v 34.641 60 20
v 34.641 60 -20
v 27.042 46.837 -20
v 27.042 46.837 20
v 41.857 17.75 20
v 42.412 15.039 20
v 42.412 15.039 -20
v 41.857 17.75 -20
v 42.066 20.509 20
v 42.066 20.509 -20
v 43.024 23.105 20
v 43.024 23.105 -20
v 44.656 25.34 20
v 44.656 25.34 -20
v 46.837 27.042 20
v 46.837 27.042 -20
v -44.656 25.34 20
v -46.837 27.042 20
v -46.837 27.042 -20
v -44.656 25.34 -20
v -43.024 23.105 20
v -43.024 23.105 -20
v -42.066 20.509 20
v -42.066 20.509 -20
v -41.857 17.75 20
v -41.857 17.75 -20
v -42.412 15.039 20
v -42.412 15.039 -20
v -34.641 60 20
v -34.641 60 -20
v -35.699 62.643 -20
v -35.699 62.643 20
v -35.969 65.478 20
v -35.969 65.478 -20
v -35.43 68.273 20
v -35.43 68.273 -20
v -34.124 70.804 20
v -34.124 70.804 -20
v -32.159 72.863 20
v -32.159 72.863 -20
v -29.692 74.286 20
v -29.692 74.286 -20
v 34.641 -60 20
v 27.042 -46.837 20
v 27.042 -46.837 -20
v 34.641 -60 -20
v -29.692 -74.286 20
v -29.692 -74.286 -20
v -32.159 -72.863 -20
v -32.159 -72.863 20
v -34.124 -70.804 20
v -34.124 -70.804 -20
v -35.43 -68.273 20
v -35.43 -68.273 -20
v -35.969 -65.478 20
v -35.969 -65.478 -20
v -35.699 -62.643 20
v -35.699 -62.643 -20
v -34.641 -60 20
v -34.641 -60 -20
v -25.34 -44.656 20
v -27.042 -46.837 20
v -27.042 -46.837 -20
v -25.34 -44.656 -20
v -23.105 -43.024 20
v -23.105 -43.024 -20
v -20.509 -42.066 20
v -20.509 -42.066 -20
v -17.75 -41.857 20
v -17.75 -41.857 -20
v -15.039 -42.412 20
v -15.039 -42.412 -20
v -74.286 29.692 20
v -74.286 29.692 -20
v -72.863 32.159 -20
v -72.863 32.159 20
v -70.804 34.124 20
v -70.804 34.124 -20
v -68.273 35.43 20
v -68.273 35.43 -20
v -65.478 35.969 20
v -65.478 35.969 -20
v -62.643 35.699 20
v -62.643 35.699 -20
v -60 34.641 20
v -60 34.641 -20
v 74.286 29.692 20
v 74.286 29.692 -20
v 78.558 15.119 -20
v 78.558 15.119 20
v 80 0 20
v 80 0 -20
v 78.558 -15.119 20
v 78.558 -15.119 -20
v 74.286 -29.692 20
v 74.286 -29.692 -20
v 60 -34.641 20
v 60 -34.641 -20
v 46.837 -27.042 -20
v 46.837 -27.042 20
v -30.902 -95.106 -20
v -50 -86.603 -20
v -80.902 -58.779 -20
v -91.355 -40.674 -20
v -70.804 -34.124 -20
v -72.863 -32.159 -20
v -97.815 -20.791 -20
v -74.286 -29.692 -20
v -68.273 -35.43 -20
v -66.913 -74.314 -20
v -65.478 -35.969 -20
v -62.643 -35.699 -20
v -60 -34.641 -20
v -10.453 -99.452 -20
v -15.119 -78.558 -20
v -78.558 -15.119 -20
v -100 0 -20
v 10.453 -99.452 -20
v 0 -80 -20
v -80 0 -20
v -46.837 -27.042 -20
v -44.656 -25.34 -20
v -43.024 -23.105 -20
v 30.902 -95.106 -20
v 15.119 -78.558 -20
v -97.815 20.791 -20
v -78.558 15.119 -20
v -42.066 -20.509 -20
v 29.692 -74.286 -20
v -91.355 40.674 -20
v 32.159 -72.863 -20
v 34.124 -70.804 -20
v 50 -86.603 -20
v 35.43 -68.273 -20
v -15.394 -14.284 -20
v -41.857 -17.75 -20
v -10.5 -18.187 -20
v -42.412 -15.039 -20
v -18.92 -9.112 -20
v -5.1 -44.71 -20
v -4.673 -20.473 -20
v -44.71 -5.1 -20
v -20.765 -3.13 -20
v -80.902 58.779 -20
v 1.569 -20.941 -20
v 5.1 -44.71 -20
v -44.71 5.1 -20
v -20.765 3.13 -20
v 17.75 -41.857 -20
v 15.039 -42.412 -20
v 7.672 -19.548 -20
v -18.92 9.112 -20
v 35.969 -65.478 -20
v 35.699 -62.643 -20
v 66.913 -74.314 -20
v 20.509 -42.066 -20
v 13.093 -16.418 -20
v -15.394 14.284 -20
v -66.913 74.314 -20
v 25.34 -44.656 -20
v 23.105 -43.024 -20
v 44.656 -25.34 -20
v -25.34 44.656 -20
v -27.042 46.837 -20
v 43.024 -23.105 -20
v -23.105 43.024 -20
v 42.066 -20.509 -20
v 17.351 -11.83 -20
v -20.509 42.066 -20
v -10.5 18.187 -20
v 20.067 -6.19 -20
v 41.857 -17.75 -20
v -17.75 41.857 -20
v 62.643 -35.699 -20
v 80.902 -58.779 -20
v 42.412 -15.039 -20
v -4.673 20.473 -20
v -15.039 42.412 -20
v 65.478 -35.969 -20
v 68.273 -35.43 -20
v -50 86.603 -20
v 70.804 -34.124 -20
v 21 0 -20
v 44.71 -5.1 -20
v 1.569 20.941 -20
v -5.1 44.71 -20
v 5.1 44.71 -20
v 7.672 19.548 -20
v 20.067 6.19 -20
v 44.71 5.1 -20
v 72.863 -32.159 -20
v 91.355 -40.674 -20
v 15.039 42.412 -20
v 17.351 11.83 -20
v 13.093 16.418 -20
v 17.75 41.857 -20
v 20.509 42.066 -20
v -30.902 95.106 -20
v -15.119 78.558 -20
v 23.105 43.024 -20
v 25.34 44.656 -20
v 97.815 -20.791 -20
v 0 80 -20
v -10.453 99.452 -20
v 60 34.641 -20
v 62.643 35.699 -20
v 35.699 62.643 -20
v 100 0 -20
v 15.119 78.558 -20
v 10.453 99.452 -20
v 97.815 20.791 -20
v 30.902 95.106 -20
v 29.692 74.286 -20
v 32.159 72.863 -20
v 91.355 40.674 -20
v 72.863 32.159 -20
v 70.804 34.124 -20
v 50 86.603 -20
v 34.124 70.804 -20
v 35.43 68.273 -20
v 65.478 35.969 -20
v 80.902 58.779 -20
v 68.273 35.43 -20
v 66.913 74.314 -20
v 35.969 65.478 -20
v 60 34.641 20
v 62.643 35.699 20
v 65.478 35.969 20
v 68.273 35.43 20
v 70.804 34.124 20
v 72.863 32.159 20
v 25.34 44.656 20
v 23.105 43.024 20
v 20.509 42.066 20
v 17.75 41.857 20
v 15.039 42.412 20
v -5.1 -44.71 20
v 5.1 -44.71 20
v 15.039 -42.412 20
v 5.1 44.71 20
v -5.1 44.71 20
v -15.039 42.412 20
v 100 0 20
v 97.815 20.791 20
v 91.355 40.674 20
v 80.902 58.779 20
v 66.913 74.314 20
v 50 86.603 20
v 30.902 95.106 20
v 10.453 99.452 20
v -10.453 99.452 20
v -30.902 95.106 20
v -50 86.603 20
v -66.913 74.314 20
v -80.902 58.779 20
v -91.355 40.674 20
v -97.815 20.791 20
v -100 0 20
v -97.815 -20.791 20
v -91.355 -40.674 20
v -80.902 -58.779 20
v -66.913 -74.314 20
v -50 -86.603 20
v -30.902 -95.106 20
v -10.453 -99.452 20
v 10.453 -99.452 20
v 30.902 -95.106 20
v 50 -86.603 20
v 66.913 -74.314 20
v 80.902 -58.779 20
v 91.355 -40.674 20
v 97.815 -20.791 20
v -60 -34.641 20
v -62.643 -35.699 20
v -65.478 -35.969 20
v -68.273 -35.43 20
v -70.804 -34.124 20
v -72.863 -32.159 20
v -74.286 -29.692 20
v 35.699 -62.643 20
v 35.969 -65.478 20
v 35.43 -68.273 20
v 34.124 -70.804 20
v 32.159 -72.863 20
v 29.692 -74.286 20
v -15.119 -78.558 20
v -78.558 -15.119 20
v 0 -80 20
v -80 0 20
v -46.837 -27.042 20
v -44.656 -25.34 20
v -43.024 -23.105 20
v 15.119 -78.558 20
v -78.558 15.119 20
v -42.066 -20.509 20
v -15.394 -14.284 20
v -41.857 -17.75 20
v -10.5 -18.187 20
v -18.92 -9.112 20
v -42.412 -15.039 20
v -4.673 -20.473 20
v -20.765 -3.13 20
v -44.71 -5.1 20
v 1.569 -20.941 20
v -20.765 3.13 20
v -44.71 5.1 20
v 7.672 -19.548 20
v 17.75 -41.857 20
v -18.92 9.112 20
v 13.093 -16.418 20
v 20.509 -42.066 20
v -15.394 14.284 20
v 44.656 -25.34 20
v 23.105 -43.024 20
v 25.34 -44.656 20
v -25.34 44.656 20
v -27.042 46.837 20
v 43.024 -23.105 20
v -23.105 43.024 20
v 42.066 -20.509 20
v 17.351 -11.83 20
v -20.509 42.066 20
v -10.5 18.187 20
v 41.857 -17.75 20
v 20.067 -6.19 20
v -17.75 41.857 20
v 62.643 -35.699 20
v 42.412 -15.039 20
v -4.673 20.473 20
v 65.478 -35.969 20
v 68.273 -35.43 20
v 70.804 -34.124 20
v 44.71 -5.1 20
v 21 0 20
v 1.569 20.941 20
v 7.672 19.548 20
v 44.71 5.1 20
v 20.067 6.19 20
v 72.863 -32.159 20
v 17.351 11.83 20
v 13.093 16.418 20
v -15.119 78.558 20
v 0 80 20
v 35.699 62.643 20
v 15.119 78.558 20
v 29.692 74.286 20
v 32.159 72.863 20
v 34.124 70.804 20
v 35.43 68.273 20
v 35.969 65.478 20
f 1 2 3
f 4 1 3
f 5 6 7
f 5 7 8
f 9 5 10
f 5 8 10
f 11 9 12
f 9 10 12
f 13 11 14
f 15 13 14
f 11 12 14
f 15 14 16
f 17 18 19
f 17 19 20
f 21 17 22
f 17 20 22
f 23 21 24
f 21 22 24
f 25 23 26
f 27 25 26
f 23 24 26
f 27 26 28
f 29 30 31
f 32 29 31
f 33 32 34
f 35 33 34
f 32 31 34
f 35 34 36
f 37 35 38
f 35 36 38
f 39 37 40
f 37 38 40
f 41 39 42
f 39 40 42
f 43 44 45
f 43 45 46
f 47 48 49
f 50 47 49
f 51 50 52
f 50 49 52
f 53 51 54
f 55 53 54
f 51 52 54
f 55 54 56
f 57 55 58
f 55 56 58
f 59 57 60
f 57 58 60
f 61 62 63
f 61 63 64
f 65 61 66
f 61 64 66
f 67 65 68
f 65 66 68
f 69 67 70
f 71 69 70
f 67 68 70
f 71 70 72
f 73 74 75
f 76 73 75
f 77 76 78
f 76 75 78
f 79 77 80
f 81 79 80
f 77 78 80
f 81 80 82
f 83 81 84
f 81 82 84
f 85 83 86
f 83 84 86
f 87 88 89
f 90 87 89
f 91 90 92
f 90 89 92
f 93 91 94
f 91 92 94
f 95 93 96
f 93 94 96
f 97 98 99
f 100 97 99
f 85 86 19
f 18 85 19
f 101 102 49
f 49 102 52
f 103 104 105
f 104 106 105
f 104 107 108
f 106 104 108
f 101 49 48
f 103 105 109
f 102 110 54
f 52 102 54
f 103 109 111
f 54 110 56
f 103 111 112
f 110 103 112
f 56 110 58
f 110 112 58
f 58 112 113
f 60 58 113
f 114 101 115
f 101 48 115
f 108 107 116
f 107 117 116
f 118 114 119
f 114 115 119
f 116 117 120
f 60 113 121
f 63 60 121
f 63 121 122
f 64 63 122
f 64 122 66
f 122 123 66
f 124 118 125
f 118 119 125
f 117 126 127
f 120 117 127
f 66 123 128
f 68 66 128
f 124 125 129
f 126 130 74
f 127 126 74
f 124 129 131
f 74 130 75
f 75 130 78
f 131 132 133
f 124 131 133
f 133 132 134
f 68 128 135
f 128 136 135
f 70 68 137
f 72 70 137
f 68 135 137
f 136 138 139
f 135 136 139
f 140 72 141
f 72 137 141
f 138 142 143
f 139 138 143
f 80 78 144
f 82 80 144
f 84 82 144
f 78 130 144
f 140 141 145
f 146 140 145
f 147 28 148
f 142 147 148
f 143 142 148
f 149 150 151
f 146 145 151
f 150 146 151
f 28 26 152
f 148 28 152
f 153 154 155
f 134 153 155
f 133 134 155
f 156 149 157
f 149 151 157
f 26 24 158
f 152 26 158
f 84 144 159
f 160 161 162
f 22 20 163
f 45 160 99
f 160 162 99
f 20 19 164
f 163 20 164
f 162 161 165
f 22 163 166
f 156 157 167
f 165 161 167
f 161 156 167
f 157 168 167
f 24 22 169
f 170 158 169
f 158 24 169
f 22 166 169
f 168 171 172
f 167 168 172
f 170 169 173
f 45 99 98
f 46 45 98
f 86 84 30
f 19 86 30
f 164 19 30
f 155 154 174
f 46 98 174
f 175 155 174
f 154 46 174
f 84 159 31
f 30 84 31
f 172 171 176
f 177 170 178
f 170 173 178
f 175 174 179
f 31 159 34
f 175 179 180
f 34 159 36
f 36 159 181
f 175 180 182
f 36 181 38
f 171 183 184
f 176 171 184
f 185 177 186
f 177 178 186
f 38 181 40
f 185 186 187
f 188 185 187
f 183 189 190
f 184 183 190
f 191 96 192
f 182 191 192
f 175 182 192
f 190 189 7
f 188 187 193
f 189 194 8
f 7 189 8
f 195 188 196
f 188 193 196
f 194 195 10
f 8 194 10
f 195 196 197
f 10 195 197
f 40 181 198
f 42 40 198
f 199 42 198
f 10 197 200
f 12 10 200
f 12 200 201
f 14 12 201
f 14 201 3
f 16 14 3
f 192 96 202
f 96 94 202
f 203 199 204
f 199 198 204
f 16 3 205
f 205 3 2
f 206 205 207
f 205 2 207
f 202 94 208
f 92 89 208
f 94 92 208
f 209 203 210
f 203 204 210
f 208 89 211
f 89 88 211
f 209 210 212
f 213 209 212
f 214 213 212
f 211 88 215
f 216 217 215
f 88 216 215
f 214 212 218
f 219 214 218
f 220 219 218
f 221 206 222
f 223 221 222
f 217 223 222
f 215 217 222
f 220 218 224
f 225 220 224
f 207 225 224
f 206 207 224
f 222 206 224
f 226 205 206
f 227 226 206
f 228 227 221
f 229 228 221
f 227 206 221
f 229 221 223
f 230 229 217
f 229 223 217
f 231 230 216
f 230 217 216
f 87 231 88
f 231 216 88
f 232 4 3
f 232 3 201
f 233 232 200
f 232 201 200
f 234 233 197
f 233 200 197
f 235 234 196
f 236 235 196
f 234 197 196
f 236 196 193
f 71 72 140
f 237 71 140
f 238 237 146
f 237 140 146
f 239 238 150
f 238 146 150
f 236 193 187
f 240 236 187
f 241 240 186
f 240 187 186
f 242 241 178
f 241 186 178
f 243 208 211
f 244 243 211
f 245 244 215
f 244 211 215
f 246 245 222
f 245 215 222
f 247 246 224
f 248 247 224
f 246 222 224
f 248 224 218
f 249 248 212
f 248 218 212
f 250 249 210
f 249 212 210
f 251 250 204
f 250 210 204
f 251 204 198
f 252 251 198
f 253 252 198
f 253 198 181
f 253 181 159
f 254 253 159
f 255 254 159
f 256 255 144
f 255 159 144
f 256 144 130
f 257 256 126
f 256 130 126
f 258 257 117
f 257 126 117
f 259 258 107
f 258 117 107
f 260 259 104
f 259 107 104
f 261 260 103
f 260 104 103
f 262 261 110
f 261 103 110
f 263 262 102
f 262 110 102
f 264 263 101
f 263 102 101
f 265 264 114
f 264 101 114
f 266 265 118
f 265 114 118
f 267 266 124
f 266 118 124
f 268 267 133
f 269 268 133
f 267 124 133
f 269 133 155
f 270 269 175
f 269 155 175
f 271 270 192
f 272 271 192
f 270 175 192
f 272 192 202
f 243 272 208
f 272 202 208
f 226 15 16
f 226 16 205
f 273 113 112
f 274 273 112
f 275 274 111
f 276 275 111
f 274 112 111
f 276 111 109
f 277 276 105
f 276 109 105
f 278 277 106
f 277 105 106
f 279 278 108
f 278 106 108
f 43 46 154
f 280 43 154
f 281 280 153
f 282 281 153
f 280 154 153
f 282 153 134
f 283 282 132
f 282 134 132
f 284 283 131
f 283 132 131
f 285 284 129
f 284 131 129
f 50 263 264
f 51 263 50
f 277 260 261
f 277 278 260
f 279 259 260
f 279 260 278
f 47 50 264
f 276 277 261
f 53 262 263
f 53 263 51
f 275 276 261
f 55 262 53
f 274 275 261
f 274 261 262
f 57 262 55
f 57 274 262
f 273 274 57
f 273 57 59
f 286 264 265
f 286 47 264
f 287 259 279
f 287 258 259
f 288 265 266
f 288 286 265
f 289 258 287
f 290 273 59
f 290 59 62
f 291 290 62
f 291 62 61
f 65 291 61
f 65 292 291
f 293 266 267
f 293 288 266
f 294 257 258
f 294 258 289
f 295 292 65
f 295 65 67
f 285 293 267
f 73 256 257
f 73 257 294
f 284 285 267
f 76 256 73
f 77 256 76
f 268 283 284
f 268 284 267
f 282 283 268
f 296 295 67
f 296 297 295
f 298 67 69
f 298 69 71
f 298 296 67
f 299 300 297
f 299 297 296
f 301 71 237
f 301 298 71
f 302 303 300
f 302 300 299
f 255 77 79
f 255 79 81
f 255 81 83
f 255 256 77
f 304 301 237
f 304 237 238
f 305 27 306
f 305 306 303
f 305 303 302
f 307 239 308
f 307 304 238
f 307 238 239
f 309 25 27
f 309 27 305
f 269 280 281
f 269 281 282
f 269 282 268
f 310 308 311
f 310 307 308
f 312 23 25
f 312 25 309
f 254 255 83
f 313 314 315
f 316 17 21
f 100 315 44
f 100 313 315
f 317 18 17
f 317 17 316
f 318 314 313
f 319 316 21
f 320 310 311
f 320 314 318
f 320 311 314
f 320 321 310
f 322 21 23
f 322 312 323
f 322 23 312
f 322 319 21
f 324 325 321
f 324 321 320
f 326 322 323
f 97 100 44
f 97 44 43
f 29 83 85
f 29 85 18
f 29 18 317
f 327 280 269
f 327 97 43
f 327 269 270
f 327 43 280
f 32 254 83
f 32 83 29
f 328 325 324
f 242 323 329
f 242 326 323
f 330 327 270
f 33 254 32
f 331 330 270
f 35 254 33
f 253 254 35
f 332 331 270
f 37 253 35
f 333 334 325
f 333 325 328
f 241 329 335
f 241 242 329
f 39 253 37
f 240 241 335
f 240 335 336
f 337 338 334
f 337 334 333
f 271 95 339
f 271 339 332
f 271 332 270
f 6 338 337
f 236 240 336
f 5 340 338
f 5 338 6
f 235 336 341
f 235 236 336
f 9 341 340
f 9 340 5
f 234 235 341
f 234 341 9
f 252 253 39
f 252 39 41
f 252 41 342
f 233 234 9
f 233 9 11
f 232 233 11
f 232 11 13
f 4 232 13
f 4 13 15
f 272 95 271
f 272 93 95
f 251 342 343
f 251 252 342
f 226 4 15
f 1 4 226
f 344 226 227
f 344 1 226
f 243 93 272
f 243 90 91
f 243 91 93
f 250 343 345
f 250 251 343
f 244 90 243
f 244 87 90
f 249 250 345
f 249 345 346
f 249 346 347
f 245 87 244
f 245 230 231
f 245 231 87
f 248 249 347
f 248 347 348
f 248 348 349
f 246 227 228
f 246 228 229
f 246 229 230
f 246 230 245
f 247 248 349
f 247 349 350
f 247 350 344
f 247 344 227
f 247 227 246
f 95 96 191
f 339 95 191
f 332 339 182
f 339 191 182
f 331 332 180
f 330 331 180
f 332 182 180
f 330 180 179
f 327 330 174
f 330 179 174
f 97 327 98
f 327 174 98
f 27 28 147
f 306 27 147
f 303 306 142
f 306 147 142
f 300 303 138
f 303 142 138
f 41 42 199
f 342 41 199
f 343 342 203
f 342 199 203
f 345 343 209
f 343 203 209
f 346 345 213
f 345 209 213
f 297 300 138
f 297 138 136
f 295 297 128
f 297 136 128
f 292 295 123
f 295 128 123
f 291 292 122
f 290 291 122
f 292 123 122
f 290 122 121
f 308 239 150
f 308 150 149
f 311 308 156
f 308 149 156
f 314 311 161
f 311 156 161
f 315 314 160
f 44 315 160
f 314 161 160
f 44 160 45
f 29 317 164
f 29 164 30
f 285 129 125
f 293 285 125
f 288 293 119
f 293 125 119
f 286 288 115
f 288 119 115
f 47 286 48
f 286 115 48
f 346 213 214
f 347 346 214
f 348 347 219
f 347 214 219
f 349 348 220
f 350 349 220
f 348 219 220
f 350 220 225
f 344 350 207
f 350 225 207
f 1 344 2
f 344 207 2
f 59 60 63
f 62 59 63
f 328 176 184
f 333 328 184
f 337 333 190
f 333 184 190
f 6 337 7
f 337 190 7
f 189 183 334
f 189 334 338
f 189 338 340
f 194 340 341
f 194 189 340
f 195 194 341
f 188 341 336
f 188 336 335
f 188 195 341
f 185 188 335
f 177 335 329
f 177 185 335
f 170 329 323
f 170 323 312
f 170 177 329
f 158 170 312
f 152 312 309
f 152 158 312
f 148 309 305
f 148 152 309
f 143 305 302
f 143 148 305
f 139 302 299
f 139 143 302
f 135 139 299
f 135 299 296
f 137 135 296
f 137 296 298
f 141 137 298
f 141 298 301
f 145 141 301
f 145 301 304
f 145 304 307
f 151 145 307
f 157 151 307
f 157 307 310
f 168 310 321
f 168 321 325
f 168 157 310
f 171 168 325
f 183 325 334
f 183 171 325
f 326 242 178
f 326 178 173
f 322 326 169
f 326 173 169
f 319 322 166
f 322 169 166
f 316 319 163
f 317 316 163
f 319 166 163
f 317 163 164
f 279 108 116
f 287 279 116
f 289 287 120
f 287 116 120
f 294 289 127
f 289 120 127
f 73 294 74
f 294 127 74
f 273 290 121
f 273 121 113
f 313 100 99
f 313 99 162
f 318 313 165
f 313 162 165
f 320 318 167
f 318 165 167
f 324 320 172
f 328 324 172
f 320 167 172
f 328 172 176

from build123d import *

# Parameters (mm, degrees)
BOSS_EXTRUDE1_DEPTH      = 20
BOSS_EXTRUDE1_DEPTH_BACK = 20
SKETCH1_R                = 30
SKETCH1_R_2              = 21
BOSS_EXTRUDE2_DEPTH      = 20
BOSS_EXTRUDE2_DEPTH_BACK = 20
SKETCH2_R                = 100
SKETCH2_R_2              = 21
CUT_EXTRUDE1_DEPTH       = 20
CUT_EXTRUDE1_DEPTH_BACK  = 20


with BuildPart() as part:
    # Sketch1 → Boss-Extrude1 (new, two sides: drawn at the far end of the back side and taken through both)
    with BuildSketch(Plane.XY.offset(-BOSS_EXTRUDE1_DEPTH_BACK)):
        Circle(SKETCH1_R)
        Circle(SKETCH1_R_2, mode=Mode.SUBTRACT)
    extrude(amount=BOSS_EXTRUDE1_DEPTH + BOSS_EXTRUDE1_DEPTH_BACK)

    # Sketch2 → Boss-Extrude2 (add, two sides: drawn at the far end of the back side and taken through both)
    with BuildSketch(Plane.XY.offset(-BOSS_EXTRUDE2_DEPTH_BACK)):
        Circle(SKETCH2_R)
        Circle(SKETCH2_R_2, mode=Mode.SUBTRACT)
    extrude(amount=BOSS_EXTRUDE2_DEPTH + BOSS_EXTRUDE2_DEPTH_BACK)

    # Sketch3 → Cut-Extrude1 (cut, two sides: drawn at the far end of the back side and taken through both)
    with BuildSketch(Plane.XY.offset(-CUT_EXTRUDE1_DEPTH_BACK)):
        with BuildLine():
            Line((-27.041634566, 46.837484988), (-34.641016151, 60))
            ThreePointArc((-34.641016151, 60), (-35.429873939, 68.273268354), (-29.692299558, 74.285714286))
            ThreePointArc((-29.692299558, 74.285714286), (0, 80), (29.692299558, 74.285714286))
            ThreePointArc((29.692299558, 74.285714286), (35.429873939, 68.273268354), (34.641016151, 60))
            Line((34.641016151, 60), (27.041634566, 46.837484988))
            ThreePointArc((27.041634566, 46.837484988), (21.840560017, 42.45483732), (15.039311341, 42.412487717))
            ThreePointArc((15.039311341, 42.412487717), (0, 45), (-15.039311341, 42.412487717))
            ThreePointArc((-15.039311341, 42.412487717), (-21.840560017, 42.45483732), (-27.041634566, 46.837484988))
        make_face()
        with BuildLine():
            Line((46.837484988, 27.041634566), (60, 34.641016151))
            ThreePointArc((60, 34.641016151), (68.273268354, 35.429873939), (74.285714286, 29.692299558))
            ThreePointArc((74.285714286, 29.692299558), (80, 0), (74.285714286, -29.692299558))
            ThreePointArc((74.285714286, -29.692299558), (68.273268354, -35.429873939), (60, -34.641016151))
            Line((60, -34.641016151), (46.837484988, -27.041634566))
            ThreePointArc((46.837484988, -27.041634566), (42.45483732, -21.840560017), (42.412487717, -15.039311341))
            ThreePointArc((42.412487717, -15.039311341), (45, 0), (42.412487717, 15.039311341))
            ThreePointArc((42.412487717, 15.039311341), (42.45483732, 21.840560017), (46.837484988, 27.041634566))
        make_face()
        with BuildLine():
            Line((27.041634566, -46.837484988), (34.641016151, -60))
            ThreePointArc((34.641016151, -60), (35.429873939, -68.273268354), (29.692299558, -74.285714286))
            ThreePointArc((29.692299558, -74.285714286), (0, -80), (-29.692299558, -74.285714286))
            ThreePointArc((-29.692299558, -74.285714286), (-35.429873939, -68.273268354), (-34.641016151, -60))
            Line((-34.641016151, -60), (-27.041634566, -46.837484988))
            ThreePointArc((-27.041634566, -46.837484988), (-21.840560017, -42.45483732), (-15.039311341, -42.412487717))
            ThreePointArc((-15.039311341, -42.412487717), (0, -45), (15.039311341, -42.412487717))
            ThreePointArc((15.039311341, -42.412487717), (21.840560017, -42.45483732), (27.041634566, -46.837484988))
        make_face()
        with BuildLine():
            Line((-46.837484988, -27.041634566), (-60, -34.641016151))
            ThreePointArc((-60, -34.641016151), (-68.273268354, -35.429873939), (-74.285714286, -29.692299558))
            ThreePointArc((-74.285714286, -29.692299558), (-80, 0), (-74.285714286, 29.692299558))
            ThreePointArc((-74.285714286, 29.692299558), (-68.273268354, 35.429873939), (-60, 34.641016151))
            Line((-60, 34.641016151), (-46.837484988, 27.041634566))
            ThreePointArc((-46.837484988, 27.041634566), (-42.45483732, 21.840560017), (-42.412487717, 15.039311341))
            ThreePointArc((-42.412487717, 15.039311341), (-45, 0), (-42.412487717, -15.039311341))
            ThreePointArc((-42.412487717, -15.039311341), (-42.45483732, -21.840560017), (-46.837484988, -27.041634566))
        make_face()
    extrude(amount=CUT_EXTRUDE1_DEPTH + CUT_EXTRUDE1_DEPTH_BACK, mode=Mode.SUBTRACT)


solid = part.part
